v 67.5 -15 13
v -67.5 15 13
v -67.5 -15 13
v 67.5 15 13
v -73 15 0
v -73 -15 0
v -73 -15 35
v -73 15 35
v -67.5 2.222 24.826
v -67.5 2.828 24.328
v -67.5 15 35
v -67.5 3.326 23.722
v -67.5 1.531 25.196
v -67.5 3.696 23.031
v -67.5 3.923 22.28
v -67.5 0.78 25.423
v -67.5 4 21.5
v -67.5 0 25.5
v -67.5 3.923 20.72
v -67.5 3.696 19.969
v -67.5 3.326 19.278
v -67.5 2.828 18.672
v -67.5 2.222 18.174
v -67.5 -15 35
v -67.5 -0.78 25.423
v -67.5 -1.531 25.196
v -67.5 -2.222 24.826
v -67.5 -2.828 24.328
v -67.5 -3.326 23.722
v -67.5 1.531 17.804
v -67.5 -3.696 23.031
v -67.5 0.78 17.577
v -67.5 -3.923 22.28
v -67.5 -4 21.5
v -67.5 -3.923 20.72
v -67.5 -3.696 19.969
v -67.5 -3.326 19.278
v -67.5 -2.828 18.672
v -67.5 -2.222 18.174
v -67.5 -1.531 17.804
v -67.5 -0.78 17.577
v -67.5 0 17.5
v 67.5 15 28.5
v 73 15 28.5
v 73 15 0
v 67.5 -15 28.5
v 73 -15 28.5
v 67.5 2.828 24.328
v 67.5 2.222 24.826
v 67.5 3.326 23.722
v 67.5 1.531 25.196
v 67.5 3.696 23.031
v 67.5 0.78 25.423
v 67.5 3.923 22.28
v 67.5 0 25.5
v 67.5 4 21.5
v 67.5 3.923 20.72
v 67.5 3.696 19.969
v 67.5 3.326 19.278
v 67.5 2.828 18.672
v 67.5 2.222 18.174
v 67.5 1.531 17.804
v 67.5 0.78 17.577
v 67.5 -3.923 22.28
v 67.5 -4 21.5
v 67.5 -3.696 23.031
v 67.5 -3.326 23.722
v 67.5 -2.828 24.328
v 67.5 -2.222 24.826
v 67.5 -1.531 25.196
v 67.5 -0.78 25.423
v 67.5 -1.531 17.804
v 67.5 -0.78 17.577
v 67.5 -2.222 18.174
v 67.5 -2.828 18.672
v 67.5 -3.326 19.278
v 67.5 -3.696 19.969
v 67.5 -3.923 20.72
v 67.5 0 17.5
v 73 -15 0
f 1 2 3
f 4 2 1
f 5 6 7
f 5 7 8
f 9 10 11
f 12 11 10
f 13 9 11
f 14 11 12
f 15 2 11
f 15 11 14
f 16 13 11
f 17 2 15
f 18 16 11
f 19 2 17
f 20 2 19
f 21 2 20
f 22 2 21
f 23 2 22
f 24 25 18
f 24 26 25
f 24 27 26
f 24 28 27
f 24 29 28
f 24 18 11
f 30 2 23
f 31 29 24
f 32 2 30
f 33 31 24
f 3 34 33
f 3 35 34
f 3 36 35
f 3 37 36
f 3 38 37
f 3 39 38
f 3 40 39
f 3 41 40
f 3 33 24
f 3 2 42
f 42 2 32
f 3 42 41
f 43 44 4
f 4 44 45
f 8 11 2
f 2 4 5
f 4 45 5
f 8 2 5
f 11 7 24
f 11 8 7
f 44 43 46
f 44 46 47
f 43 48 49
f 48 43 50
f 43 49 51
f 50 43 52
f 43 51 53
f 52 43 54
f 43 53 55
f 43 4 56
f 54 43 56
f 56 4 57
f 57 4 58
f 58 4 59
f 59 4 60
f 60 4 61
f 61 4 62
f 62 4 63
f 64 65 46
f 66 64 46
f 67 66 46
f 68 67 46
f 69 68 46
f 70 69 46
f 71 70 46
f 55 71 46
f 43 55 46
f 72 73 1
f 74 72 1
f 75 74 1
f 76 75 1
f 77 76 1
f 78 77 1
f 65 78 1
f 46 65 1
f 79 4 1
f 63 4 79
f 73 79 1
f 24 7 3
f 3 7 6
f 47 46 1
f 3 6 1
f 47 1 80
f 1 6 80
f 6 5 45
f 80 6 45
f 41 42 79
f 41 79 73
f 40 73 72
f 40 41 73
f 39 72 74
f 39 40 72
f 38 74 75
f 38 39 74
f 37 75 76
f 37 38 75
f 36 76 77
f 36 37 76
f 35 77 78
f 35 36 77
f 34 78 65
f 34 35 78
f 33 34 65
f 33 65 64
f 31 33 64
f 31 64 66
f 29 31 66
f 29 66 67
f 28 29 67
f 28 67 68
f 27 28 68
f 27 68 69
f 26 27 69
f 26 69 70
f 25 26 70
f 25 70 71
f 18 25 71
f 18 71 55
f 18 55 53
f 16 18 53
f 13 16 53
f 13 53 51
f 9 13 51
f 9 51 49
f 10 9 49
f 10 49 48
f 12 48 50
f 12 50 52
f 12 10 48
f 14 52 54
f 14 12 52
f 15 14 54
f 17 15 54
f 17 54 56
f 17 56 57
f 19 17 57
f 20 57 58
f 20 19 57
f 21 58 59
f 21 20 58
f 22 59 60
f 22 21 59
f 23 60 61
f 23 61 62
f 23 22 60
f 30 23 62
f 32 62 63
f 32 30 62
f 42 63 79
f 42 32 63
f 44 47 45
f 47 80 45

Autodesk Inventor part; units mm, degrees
ref_plane "YZ Plane" through (0, 0, 0) normal (1, 0, 0) x (0, 1, 0)
ref_plane "XZ Plane" through (0, 0, 0) normal (0, 1, 0) x (-1, 0, 0)
ref_plane "XY Plane" through (0, 0, 0) normal (0, 0, 1) x (1, 0, 0)
sketch "Sketch1" plane through (0, 0, 0) normal (0, 0, 1) x (1, 0, 0)
  line L0 (73, -15) -> (-73, -15)
  line L1 (-73, -15) -> (-73, 15)
  line L2 (-73, 15) -> (73, 15)
  line L3 (73, 15) -> (73, -15)
  line L4 (73, -15) -> (-73, 15) construction
  line L5 (-73, -15) -> (73, 15) construction
  point P0 (0, 0)
  dimension "d0" = 146
  dimension "d1" = 30
extrude "Extrusion1" add sketch "Sketch1" along normal blind 13
sketch "Sketch2" plane through (0, 0, 13) normal (0, 0, 1) x (1, 0, 0)
  line L0 (-73, 15) -> (-73, -15) projected
  line L1 (-73, -15) -> (73, -15) projected
  line L2 (73, -15) -> (73, 15) projected
  line L3 (73, 15) -> (-73, 15) projected
  line L4 (-67.5, 15) -> (-67.5, -15)
  line L5 (67.5, 15) -> (67.5, -15)
  point P0 (0, 0)
  dimension "d4" = 5.5
  dimension "d5" = 5.5
extrude "Extrusion2" add sketch "Sketch2" along normal blind 22 contours L3 L4 L1 L0
extrude "Extrusion3" add sketch "Sketch2" along normal blind 15.5 contours L3 L2 L1 L5
sketch "Sketch3" plane through (-67.5, -15, 13) normal (1, 0, 0) x (0, 0, -1)
  line L0 (-22, 0) -> (0, 30)
  circle A0 centre (-11, 15) radius 4.5
  line L1 (-22, 0) -> (-22, 30) projected
  line L2 (-22, 15) -> (-12.5, 15)
  line L3 (-12.5, 15) -> (-8.5, 15)
  circle A1 centre (-8.5, 15) radius 4
  point P0 (13, 15)
  dimension "d10" = 9
  dimension "d21" = 9.5
  dimension "d22" = 4
extrude "Extrusion7" add sketch "Sketch3" along normal up to surface (135 mm away) contours A1 L3 L0 | L0 A0 A1 | A0 L0 A1 | L3 A1 A0 L0 | A1 L0 A0 picked at (-9.6413, 12.9367) picked at (-5.914, 15.6712) picked at (-8.2588, 18.8681)
thread "Thread2" size "M8x1.25" class "6g" standard "ANSI Metric M Profile" full length
properties part number "linear trail"
